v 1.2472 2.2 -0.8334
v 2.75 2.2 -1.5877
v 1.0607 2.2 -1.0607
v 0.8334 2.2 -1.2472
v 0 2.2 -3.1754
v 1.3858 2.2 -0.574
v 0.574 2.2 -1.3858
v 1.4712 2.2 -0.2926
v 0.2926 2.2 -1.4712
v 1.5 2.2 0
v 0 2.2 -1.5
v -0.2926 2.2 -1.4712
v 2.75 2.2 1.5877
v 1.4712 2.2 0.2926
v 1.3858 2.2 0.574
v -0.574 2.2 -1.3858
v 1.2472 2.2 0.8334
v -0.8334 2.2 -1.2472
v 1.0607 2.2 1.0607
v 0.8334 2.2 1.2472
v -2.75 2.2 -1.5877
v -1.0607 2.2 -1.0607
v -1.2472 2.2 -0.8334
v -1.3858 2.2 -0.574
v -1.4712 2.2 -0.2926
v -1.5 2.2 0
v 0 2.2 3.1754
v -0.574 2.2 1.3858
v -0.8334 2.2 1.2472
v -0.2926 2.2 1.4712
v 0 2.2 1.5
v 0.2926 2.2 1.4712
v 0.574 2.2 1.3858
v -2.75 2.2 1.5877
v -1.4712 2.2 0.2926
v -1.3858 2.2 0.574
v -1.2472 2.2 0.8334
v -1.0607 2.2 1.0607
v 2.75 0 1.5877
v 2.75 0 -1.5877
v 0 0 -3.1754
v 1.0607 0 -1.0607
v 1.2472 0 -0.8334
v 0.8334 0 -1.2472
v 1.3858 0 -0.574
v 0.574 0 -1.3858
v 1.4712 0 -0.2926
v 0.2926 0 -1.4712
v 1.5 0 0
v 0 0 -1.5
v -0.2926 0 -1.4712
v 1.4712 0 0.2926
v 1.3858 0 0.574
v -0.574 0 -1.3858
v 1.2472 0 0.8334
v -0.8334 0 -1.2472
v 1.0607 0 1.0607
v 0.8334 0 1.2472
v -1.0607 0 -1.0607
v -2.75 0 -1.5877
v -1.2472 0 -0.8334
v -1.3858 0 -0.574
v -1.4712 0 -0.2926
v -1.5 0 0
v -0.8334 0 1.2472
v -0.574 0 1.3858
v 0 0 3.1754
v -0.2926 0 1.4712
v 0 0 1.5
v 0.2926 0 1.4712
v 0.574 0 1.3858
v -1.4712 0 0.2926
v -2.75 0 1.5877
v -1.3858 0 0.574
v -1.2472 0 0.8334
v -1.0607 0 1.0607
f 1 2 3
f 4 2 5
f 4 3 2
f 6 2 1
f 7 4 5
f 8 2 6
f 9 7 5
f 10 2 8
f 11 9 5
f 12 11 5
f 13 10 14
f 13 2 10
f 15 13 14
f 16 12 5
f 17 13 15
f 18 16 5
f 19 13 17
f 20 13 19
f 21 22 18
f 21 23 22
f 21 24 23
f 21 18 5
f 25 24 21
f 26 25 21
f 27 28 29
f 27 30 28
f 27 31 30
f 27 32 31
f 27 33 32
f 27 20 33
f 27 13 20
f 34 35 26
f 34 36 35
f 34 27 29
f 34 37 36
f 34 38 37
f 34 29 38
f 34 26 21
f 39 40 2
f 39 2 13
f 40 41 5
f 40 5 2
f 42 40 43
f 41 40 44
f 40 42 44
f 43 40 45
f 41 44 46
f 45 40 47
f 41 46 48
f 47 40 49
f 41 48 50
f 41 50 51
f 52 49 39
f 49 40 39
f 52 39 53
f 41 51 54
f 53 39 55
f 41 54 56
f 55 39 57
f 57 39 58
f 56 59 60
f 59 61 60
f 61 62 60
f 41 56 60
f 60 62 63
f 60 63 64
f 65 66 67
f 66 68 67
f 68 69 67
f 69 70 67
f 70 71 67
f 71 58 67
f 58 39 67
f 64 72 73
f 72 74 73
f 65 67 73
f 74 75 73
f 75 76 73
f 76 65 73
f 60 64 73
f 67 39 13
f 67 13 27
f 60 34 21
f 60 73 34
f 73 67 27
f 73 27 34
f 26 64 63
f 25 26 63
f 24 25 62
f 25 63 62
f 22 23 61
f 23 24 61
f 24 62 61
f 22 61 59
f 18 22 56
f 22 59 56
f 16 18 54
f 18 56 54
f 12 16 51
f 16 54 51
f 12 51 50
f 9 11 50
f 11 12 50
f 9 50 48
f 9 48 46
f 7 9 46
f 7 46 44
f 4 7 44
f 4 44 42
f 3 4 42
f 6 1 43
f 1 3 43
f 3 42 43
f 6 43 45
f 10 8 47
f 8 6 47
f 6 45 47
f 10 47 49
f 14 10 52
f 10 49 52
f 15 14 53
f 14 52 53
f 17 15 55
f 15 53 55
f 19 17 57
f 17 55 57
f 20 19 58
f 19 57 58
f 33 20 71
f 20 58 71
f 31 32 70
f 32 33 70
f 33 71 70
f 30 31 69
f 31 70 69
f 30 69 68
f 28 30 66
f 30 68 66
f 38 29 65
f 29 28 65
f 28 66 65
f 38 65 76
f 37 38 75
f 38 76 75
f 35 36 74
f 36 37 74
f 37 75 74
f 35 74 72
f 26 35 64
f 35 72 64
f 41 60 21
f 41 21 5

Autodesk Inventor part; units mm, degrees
ref_plane "YZ Plane" through (0, 0, 0) normal (1, 0, 0) x (0, 1, 0)
ref_plane "XZ Plane" through (0, 0, 0) normal (0, 1, 0) x (-1, 0, 0)
ref_plane "XY Plane" through (0, 0, 0) normal (0, 0, 1) x (1, 0, 0)
sketch "Sketch1" plane through (0, 0, 0) normal (0, 1, 0) x (-1, 0, 0)
  line L0 (0, 3.1754) -> (2.75, 1.5877)
  line L1 (2.75, 1.5877) -> (2.75, -1.5877)
  line L2 (2.75, -1.5877) -> (0, -3.1754)
  line L3 (0, -3.1754) -> (-2.75, -1.5877)
  line L4 (-2.75, -1.5877) -> (-2.75, 1.5877)
  line L5 (-2.75, 1.5877) -> (0, 3.1754)
  circle A0 centre (0, 0) radius 1.5
  point P0 (2.75, 0)
  dimension "d0" = 5.5
  dimension "d1" = 3
extrude "Extrusion1" add sketch "Sketch1" along normal blind 2.2
properties part number "Tuerca_M3" material "Stainless Steel"
